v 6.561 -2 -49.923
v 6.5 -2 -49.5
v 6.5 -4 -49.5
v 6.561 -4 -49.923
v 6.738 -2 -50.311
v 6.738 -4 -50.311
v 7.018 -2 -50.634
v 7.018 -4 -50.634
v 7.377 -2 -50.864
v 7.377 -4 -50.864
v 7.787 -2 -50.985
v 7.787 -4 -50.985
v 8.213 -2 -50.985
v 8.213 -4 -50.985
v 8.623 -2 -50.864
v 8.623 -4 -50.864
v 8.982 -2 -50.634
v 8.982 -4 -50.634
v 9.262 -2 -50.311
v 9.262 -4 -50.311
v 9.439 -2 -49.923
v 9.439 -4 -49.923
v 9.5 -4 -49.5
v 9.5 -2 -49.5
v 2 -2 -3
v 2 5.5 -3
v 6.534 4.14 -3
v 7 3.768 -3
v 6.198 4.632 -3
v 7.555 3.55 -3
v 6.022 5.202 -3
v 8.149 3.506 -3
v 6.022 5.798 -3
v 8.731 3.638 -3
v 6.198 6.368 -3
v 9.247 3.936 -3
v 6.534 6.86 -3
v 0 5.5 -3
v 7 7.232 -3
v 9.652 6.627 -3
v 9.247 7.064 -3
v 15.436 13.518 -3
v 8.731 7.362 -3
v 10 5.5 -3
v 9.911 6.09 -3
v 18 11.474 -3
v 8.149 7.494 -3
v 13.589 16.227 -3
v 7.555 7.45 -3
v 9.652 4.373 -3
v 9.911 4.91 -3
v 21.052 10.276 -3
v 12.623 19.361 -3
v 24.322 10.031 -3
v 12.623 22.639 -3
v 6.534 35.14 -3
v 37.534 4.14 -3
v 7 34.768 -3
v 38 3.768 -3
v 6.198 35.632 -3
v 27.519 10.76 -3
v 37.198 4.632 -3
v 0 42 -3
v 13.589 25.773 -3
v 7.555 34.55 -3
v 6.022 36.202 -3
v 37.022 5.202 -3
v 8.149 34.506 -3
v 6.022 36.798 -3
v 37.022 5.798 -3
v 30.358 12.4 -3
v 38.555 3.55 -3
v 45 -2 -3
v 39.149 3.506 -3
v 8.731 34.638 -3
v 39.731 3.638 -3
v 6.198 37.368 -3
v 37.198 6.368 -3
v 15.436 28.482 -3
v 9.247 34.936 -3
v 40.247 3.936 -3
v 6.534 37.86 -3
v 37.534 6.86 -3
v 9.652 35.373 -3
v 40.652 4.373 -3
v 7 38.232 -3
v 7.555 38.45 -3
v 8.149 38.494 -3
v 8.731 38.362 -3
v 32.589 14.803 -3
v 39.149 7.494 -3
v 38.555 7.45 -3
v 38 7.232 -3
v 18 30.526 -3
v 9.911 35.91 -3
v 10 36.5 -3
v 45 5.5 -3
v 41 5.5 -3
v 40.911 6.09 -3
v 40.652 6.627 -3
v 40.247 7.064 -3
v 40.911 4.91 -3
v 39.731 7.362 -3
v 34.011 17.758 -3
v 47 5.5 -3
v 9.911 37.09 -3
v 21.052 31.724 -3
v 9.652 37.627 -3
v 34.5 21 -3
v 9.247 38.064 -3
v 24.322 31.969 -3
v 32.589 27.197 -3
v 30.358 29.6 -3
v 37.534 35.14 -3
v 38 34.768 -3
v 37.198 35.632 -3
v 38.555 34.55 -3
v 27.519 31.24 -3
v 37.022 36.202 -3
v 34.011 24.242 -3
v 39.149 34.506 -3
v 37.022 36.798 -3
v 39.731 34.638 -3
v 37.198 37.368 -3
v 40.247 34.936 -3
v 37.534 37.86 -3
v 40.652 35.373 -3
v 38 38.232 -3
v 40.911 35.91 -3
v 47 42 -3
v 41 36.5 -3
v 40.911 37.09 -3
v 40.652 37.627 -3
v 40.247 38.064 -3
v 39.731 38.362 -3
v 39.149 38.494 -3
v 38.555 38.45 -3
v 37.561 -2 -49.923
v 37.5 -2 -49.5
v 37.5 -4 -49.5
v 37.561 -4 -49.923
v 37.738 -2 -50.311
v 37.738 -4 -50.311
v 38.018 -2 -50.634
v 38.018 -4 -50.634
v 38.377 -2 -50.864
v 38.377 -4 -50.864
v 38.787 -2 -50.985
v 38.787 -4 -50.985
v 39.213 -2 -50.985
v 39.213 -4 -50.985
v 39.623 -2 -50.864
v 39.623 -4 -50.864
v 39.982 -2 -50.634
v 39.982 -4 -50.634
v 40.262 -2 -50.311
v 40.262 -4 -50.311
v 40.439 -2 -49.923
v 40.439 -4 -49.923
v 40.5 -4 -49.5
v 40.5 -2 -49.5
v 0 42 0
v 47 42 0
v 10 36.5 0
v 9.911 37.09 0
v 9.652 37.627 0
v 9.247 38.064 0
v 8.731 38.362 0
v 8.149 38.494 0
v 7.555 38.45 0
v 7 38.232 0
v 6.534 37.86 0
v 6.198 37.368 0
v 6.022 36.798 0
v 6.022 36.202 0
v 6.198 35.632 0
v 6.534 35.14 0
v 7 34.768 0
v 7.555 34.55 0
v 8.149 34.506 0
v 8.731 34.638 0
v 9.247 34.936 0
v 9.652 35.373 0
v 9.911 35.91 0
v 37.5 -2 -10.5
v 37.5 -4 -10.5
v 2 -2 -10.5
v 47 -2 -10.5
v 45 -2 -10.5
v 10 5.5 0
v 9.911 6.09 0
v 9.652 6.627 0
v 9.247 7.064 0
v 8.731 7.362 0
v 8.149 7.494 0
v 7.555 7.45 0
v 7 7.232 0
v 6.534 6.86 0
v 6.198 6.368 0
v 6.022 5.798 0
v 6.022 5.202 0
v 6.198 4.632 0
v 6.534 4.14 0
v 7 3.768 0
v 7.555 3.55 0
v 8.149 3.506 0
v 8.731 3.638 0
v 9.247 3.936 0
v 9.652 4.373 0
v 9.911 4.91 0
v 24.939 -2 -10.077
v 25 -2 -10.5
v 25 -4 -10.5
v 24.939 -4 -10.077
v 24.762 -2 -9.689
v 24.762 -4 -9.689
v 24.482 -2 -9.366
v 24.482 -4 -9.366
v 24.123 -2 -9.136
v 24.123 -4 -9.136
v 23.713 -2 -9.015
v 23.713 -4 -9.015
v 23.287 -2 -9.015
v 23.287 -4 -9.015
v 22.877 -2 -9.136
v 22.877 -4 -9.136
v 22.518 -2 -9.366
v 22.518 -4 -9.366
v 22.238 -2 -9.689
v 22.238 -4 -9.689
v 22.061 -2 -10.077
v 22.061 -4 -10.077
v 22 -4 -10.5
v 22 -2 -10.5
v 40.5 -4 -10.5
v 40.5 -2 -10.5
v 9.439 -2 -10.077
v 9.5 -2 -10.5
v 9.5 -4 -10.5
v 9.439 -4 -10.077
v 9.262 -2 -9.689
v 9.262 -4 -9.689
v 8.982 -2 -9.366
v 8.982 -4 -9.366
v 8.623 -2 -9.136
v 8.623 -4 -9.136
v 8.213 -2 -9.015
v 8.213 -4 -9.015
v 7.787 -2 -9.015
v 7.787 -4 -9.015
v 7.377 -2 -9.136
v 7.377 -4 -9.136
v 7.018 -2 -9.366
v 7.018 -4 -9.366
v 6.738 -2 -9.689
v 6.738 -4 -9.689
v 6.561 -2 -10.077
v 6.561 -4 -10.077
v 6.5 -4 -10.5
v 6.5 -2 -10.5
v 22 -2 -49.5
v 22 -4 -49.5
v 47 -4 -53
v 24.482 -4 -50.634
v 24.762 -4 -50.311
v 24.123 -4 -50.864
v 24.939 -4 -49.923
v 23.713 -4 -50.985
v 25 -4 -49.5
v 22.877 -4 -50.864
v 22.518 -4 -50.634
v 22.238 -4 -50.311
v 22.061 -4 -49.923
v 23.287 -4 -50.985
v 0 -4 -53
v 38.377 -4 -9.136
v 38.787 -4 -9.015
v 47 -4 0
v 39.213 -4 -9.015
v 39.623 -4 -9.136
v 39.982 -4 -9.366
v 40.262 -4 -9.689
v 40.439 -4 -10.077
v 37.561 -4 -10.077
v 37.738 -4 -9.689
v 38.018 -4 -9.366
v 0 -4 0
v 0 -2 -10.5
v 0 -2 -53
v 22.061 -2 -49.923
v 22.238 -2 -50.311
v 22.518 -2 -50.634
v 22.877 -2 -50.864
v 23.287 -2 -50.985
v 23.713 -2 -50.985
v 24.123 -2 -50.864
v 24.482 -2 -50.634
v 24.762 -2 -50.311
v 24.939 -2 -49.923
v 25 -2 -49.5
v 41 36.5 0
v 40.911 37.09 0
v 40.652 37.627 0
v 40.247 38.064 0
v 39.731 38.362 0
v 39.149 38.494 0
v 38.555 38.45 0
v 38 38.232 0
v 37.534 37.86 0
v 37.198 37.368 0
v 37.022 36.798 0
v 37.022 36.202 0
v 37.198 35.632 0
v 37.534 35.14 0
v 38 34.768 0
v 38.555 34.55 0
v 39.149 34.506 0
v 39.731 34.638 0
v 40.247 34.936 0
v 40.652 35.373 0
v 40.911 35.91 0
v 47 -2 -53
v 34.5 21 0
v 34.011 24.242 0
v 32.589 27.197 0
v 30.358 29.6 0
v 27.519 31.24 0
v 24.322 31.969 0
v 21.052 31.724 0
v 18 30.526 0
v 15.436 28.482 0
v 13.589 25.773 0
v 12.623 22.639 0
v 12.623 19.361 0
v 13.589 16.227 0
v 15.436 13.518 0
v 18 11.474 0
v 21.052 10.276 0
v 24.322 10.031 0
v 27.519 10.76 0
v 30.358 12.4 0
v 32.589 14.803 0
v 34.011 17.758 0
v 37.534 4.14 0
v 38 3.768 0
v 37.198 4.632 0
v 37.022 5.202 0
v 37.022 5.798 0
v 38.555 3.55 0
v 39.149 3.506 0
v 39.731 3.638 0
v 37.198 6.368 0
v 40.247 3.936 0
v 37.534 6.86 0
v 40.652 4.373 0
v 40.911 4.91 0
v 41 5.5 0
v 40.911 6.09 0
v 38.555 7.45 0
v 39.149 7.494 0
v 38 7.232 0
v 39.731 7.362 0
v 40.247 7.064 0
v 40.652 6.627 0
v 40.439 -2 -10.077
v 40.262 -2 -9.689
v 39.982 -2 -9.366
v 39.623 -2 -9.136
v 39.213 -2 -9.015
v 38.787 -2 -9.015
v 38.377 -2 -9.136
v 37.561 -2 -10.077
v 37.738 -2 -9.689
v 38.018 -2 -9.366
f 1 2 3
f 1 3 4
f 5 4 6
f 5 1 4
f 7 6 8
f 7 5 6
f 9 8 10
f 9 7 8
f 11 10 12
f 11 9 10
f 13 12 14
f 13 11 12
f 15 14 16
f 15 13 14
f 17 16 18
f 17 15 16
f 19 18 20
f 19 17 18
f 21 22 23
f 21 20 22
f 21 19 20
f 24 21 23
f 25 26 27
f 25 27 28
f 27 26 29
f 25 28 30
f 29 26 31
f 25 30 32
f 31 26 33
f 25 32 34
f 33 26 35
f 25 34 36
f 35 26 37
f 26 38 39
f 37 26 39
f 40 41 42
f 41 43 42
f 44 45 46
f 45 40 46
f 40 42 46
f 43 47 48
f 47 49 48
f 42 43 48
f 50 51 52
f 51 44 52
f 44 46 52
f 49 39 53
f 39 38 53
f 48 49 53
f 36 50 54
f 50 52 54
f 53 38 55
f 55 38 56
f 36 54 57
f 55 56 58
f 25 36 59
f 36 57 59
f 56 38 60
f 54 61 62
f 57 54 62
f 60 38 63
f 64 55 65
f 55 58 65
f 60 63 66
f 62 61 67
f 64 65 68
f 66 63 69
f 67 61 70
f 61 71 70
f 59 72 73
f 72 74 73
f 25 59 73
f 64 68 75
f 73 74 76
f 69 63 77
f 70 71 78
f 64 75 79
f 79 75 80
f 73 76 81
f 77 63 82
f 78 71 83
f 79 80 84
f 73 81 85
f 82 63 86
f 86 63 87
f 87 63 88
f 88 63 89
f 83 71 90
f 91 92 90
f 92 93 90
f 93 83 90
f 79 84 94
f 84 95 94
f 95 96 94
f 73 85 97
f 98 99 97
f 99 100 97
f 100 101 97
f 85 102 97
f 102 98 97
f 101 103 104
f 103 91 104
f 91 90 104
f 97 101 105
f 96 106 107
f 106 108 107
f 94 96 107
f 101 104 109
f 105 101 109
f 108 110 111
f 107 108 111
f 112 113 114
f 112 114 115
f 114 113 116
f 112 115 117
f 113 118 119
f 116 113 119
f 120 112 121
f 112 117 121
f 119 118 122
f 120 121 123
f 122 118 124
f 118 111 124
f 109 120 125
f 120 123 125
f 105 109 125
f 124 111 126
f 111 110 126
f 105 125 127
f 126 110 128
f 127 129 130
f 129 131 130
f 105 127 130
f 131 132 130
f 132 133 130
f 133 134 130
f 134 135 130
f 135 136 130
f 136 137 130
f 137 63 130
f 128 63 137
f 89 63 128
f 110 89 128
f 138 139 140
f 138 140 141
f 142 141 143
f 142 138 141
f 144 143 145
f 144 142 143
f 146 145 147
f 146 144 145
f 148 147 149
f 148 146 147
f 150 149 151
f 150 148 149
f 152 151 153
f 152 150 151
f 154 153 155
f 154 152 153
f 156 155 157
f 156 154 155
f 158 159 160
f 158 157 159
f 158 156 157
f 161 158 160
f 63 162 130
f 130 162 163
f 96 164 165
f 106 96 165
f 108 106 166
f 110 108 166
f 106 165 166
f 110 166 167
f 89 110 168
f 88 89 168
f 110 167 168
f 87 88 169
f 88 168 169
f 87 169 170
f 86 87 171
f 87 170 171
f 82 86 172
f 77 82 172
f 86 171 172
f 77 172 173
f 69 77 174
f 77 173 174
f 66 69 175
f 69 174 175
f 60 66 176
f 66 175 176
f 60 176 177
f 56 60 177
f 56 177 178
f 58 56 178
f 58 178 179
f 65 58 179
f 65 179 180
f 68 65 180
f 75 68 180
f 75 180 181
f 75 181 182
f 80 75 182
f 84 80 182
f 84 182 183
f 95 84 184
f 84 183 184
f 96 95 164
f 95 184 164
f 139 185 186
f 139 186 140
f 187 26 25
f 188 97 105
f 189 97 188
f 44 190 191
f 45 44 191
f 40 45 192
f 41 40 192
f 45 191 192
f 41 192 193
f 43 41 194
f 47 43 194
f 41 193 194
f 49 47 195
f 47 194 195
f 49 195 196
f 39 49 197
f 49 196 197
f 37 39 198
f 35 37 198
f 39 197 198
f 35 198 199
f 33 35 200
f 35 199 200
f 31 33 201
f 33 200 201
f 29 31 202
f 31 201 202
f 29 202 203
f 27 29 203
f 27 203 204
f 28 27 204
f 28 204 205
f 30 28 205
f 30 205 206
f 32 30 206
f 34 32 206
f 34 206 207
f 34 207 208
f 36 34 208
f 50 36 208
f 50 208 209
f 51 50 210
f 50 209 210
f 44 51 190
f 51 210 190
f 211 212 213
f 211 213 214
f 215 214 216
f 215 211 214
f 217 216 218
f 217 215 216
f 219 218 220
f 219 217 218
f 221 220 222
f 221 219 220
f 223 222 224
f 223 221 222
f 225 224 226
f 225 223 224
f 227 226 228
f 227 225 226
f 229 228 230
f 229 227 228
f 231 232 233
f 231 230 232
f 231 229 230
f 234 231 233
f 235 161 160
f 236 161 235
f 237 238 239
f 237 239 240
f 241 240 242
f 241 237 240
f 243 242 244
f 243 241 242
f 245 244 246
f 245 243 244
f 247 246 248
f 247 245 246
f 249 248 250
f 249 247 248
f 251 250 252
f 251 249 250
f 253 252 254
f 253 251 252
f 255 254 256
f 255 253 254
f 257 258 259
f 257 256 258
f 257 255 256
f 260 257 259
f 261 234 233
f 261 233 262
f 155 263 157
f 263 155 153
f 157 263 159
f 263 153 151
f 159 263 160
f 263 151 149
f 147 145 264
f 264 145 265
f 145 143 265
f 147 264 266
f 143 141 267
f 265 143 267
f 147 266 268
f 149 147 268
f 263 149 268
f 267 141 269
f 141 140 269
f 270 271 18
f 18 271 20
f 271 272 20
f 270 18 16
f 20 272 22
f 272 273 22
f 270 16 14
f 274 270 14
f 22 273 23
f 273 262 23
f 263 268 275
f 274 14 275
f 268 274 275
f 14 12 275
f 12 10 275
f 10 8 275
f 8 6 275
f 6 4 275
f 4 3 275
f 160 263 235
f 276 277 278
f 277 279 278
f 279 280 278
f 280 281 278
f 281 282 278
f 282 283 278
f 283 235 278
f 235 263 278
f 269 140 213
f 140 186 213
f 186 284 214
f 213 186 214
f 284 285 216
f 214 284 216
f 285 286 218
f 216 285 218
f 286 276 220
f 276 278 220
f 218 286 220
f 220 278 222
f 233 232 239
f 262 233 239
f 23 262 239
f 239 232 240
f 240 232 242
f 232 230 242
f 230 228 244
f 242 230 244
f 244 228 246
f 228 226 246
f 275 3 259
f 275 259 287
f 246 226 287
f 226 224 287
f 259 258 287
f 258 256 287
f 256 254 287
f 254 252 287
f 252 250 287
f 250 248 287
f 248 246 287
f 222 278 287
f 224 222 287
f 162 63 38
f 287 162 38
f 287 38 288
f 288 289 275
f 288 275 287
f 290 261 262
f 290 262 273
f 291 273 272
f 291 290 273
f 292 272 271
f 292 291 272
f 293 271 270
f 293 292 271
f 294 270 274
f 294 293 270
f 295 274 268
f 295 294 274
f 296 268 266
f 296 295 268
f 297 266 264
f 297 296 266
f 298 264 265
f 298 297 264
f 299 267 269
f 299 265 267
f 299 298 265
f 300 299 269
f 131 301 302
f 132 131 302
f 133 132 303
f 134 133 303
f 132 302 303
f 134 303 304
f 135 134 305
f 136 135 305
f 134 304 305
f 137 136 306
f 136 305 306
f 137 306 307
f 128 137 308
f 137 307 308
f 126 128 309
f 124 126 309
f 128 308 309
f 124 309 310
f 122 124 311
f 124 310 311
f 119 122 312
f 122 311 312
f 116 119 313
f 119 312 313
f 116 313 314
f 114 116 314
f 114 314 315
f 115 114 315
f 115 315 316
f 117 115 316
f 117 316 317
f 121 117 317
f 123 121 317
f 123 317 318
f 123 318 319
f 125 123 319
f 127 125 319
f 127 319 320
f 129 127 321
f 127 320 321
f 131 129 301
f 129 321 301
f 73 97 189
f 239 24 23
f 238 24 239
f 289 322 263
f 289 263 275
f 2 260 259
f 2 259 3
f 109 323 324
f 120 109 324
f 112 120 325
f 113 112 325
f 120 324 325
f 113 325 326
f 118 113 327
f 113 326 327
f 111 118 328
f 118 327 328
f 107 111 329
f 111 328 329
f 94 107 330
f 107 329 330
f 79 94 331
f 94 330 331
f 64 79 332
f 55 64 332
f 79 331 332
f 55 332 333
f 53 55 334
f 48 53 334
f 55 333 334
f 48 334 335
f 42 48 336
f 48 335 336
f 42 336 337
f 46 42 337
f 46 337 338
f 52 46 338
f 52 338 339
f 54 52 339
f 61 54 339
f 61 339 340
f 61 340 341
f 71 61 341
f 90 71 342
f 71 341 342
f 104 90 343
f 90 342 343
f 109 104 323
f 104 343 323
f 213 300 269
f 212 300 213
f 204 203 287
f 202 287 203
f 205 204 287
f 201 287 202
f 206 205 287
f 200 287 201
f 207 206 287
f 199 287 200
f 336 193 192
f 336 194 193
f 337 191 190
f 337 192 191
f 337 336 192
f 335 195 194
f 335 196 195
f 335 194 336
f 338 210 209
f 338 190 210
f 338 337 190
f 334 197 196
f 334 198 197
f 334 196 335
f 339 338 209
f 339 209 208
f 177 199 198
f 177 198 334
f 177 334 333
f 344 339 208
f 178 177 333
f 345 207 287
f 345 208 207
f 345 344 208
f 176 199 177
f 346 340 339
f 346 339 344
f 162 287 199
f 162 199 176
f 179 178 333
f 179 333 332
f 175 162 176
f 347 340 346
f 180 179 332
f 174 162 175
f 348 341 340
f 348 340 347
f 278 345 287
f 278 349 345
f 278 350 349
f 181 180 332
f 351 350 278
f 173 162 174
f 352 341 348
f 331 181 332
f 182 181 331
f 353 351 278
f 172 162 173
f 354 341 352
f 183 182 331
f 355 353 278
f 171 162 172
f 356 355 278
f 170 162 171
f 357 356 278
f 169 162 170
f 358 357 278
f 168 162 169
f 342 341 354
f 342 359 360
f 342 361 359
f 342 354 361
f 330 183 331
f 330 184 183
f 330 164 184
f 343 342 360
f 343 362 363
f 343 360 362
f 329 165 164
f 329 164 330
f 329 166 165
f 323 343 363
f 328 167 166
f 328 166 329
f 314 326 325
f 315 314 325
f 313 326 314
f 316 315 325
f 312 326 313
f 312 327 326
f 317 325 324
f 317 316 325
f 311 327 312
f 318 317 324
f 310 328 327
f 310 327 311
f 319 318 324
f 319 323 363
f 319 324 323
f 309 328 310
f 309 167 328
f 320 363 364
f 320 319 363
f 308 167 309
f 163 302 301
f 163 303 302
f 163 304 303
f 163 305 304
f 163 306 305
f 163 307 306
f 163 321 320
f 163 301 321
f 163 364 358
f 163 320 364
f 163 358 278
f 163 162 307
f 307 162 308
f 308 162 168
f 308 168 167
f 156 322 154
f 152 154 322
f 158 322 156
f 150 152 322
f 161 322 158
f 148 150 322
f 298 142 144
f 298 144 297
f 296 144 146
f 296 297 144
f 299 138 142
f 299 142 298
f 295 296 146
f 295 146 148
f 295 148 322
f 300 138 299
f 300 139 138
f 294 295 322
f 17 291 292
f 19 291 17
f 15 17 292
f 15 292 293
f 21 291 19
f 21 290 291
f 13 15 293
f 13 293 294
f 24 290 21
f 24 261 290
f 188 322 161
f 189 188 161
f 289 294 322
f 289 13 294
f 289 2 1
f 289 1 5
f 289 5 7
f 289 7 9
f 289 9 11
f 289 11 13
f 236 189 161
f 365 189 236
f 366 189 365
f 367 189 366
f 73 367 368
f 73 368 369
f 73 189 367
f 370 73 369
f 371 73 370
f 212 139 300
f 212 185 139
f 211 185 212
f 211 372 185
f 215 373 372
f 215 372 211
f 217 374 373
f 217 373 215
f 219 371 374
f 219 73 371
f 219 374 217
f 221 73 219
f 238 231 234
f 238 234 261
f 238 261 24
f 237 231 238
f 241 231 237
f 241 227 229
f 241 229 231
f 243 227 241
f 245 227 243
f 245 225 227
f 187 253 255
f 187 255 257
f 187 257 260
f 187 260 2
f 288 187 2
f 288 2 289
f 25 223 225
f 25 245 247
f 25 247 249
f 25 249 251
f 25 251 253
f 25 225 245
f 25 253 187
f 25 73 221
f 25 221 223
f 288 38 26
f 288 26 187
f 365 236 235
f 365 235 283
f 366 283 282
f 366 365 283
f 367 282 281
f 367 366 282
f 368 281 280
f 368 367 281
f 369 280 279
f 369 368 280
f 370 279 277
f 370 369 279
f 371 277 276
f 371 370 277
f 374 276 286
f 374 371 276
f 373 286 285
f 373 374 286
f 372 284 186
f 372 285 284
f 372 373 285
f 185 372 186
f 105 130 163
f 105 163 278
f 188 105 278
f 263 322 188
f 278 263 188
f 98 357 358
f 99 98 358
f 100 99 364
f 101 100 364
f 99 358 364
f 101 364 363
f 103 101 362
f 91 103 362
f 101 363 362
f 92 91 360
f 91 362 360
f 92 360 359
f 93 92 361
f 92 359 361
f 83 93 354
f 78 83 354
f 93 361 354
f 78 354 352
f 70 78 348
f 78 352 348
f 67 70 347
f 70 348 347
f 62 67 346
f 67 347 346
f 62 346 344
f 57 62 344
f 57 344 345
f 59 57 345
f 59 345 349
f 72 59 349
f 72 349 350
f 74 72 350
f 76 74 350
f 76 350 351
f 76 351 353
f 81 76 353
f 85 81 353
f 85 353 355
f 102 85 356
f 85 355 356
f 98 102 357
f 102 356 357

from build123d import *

# Parameters (mm, degrees)
SKETCH2_W           = 47
SKETCH2_H           = 42
SKETCH2_R           = 2
SKETCH2_R_2         = 11
BOSS_EXTRUDE1_DEPTH = 3
SKETCH2_3_W         = 47
SKETCH2_3_H         = 4
BOSS_EXTRUDE2_DEPTH = 3
SKETCH3_W           = 47
SKETCH3_H           = 2
BOSS_EXTRUDE3_DEPTH = 50
RIB1_REACH          = 84.353
SKETCH8_WALL_W      = 177.312400038
SKETCH8_WALL_H      = 2
RIB2_REACH          = 84.353
SKETCH10_WALL_W     = 177.312400038
SKETCH10_WALL_H     = 2
CUT_EXTRUDE1_DEPTH  = 50


with BuildPart() as part:
    # Sketch2 → Boss-Extrude1 (new body)
    with BuildSketch(Plane.XY):
        with Locations((23.5, 21)):
            Rectangle(SKETCH2_W, SKETCH2_H)
        with Locations((39, 5.5)):
            Circle(SKETCH2_R, mode=Mode.SUBTRACT)
        with Locations((8, 5.5)):
            Circle(SKETCH2_R, mode=Mode.SUBTRACT)
        with Locations((23.5, 21)):
            Circle(SKETCH2_R_2, mode=Mode.SUBTRACT)
        with Locations((39, 36.5)):
            Circle(SKETCH2_R, mode=Mode.SUBTRACT)
        with Locations((8, 36.5)):
            Circle(SKETCH2_R, mode=Mode.SUBTRACT)
    extrude(amount=-BOSS_EXTRUDE1_DEPTH)

    # Sketch2<3> → Boss-Extrude2 (add)
    with BuildSketch(Plane.XY):
        with Locations((23.5, -2)):
            Rectangle(SKETCH2_3_W, SKETCH2_3_H)
    extrude(amount=-BOSS_EXTRUDE2_DEPTH)

    # Sketch3 → Boss-Extrude3 (add)
    with BuildSketch(Plane(origin=(0, 0, -3), x_dir=(-1, 0, 0), z_dir=(0, 0, -1))):
        with Locations((-23.5, -3)):
            Rectangle(SKETCH3_W, SKETCH3_H)
    extrude(amount=BOSS_EXTRUDE3_DEPTH)

    # Sketch8 wall → Rib1 (add, up to next)
    with BuildSketch(Plane(origin=(0, 1.75, -6.75), x_dir=(0, -0.707106781187, -0.707106781187), z_dir=(0, 0.707106781187, -0.707106781187)), mode=Mode.PRIVATE) as rib1_sk1:
        with Locations((0, -1)):
            Rectangle(SKETCH8_WALL_W, SKETCH8_WALL_H)
    rib1_tool1 = extrude(rib1_sk1.sketch, amount=-RIB1_REACH, mode=Mode.PRIVATE) - part.part
    add(rib1_tool1.solids().sort_by_distance((0, 1.75, -6.75))[0])

    # Sketch10 wall → Rib2 (add, up to next)
    with BuildSketch(Plane(origin=(47, 1.75, -6.75), x_dir=(0, -0.707106781187, -0.707106781187), z_dir=(0, 0.707106781187, -0.707106781187)), mode=Mode.PRIVATE) as rib2_sk1:
        with Locations((0, 1)):
            Rectangle(SKETCH10_WALL_W, SKETCH10_WALL_H)
    rib2_tool1 = extrude(rib2_sk1.sketch, amount=-RIB2_REACH, mode=Mode.PRIVATE) - part.part
    add(rib2_tool1.solids().sort_by_distance((47, 1.75, -6.75))[0])

    # Sketch11 → Cut-Extrude1 (cut)
    with BuildSketch(Plane(origin=(0, -2, 0), x_dir=(1, 0, 0), z_dir=(0, 1, 0))):
        with BuildLine():
            Line((9.5, 49.5), (9.5, 10.5))
            ThreePointArc((9.5, 10.5), (8, 9), (6.5, 10.5))
            Line((6.5, 10.5), (6.5, 49.5))
            ThreePointArc((6.5, 49.5), (8, 51), (9.5, 49.5))
        make_face()
        with BuildLine():
            Line((22, 10.5), (22, 49.5))
            ThreePointArc((22, 49.5), (23.5, 51), (25, 49.5))
            Line((25, 49.5), (25, 10.5))
            ThreePointArc((25, 10.5), (23.5, 9), (22, 10.5))
        make_face()
        with BuildLine():
            Line((40.5, 49.5), (40.5, 10.5))
            ThreePointArc((40.5, 10.5), (39, 9), (37.5, 10.5))
            Line((37.5, 10.5), (37.5, 49.5))
            ThreePointArc((37.5, 49.5), (39, 51), (40.5, 49.5))
        make_face()
    extrude(amount=-CUT_EXTRUDE1_DEPTH, mode=Mode.SUBTRACT)


solid = part.part
